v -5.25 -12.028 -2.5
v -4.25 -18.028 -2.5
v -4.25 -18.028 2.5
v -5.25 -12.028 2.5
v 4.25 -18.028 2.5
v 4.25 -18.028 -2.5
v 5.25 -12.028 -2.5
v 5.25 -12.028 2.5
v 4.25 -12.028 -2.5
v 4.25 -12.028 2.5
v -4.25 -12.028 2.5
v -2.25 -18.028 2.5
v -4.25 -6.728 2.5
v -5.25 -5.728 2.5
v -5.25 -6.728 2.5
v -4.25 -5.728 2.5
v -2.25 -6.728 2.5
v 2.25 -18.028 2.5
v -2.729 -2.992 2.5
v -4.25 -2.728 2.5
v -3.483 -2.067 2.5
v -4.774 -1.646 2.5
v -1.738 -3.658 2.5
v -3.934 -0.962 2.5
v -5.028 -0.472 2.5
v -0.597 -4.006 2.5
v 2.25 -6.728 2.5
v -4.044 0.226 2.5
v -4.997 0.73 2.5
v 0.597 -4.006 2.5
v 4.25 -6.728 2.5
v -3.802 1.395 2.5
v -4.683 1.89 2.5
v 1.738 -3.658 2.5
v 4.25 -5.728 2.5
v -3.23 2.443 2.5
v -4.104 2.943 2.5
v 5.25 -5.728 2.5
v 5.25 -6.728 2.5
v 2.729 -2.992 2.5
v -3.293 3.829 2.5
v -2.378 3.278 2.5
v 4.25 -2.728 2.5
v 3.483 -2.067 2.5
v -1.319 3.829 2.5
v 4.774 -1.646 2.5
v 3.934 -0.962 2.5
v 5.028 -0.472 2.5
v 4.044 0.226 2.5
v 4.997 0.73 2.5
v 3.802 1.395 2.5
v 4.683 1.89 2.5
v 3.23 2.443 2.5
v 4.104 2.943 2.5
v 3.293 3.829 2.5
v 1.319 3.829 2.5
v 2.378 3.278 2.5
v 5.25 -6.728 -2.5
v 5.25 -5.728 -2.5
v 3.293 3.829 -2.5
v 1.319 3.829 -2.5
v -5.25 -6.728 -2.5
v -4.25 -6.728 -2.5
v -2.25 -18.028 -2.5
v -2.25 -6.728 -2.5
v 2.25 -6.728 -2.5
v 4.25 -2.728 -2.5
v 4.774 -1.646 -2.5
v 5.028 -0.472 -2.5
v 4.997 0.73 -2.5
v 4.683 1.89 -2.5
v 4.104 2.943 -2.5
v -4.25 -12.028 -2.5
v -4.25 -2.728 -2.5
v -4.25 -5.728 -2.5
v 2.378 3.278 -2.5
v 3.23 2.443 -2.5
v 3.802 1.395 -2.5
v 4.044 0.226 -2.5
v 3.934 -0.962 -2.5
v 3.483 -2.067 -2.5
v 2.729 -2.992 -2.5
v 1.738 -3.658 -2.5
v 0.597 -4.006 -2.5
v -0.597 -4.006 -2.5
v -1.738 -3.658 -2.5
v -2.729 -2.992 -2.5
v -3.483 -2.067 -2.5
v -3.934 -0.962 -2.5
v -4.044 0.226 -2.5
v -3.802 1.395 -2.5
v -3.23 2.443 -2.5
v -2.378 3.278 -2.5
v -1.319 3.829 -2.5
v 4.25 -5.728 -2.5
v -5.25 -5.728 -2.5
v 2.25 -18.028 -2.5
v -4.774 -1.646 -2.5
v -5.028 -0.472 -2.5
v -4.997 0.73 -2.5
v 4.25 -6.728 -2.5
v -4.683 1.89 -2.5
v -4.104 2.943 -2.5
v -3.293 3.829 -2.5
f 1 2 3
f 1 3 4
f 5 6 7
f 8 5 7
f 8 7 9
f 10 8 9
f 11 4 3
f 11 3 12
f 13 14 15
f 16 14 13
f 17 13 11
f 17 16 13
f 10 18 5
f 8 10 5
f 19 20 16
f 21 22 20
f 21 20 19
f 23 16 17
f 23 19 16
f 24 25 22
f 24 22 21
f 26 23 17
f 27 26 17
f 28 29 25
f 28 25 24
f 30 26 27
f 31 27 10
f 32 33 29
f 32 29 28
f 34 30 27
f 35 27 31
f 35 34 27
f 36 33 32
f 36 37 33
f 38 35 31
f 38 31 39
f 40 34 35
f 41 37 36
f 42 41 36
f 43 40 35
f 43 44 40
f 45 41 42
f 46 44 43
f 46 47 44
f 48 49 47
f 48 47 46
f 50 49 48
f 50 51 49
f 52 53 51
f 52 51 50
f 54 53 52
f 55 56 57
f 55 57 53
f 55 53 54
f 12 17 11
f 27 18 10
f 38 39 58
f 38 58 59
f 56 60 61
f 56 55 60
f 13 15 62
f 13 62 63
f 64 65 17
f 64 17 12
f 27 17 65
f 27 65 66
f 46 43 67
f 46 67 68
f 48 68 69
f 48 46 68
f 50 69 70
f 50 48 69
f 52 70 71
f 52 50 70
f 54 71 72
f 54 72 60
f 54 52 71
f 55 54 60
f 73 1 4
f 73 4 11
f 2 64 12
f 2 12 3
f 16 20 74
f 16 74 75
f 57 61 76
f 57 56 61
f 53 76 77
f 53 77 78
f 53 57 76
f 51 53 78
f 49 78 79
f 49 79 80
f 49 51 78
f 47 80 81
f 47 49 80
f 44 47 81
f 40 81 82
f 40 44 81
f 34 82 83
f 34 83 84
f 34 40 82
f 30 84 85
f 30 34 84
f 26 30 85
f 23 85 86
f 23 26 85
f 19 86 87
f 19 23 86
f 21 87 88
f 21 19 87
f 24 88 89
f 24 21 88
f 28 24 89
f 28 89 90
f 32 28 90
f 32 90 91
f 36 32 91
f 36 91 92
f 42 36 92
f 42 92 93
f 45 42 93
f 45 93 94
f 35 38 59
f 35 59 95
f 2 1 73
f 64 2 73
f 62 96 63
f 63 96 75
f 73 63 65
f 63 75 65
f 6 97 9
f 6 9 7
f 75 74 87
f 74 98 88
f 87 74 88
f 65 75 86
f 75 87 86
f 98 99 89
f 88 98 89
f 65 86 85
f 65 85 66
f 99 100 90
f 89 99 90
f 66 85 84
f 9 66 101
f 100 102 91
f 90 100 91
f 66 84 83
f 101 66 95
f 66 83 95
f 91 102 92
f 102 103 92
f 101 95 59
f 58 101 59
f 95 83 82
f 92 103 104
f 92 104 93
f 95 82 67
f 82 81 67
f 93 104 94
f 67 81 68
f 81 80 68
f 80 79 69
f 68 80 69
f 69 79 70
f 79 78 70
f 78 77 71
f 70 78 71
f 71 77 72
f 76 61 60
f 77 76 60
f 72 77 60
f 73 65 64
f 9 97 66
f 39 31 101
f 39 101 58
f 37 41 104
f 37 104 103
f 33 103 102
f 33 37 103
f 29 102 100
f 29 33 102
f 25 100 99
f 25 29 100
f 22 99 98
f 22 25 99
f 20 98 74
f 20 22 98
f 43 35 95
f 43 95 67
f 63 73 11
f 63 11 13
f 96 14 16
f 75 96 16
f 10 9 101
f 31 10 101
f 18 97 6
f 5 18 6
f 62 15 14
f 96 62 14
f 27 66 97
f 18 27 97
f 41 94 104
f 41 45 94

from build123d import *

# Parameters (mm, degrees)
SKETCH2_W           = 1
SKETCH2_H           = 1.0000000000000009
BOSS_EXTRUDE1_DEPTH = 2.5
SNAP_START          = -2.5
SNAP_HOOK2_DEPTH    = 5


# Read off the part's stored shape, not the designer's step: Snap Hook2
with BuildPart() as part:
    # Sketch2 → Boss-Extrude1 (new, symmetric)
    with BuildSketch(Plane.XY):
        with BuildLine():
            Line((-1.319469931058069, 3.8290337033034687), (-3.2925675238278904, 3.8290337033034683))
            ThreePointArc((-3.2925675238278913, 3.829033703303468), (-4.9970052756714, 0.7296836814073608), (-4.25, -2.727636339397171))
            Line((-4.249999999999999, -2.7276363393971716), (-2.9937434759844463, -2.7276363393971716))
            ThreePointArc((-2.9937434759844717, -2.7276363393972467), (-3.9240837129048374, 1.0020314436757887), (-1.319469931058064, 3.829033703303436))
        make_face()
        with BuildLine():
            ThreePointArc((5.05, 0), (4.589660444702355, 2.1065414789019883), (3.29256752382789, 3.8290337033034683))
            Line((3.2925675238278904, 3.829033703303469), (1.3194699310580464, 3.8290337033034687))
            ThreePointArc((1.3194699310580424, 3.8290337033034434), (3.2974500163599956, 2.351451336857189), (4.05, 0))
            ThreePointArc((4.05, -9.9e-16), (3.7767155755853006, -1.4625045166191415), (2.9937434759845, -2.7276363393972156))
            Line((2.993743475984485, -2.7276363393971708), (4.250000000000001, -2.7276363393971708))
            ThreePointArc((4.25, -2.7276363393971708), (4.84587453407535, -1.421267040355192), (5.05, -1.24e-15))
        make_face()
        with BuildLine():
            Line((-2.9937434759844463, -2.7276363393971716), (-4.249999999999999, -2.7276363393971716))
            ThreePointArc((-4.25, -2.727636339397171), (-2.421563181711757, -4.431538305935991), (7.981e-14, -5.05))
            Line((1.49e-15, -5.05), (1.34e-15, -4.05))
            ThreePointArc((-5.11e-14, -4.05), (-1.636394332891877, -3.7046880553265678), (-2.9937434759844717, -2.7276363393972467))
        make_face()
        with BuildLine():
            Line((1.34e-15, -4.05), (1.49e-15, -5.05))
            ThreePointArc((7.981e-14, -5.05), (2.4215631817118264, -4.431538305935953), (4.25, -2.7276363393971708))
            Line((4.250000000000001, -2.7276363393971708), (2.993743475984485, -2.7276363393971708))
            ThreePointArc((2.9937434759845, -2.7276363393972156), (1.6363943328918495, -3.7046880553265797), (-5.11e-14, -4.05))
        make_face()
        with BuildLine():
            ThreePointArc((7.981e-14, -5.05), (-2.421563181711757, -4.431538305935991), (-4.25, -2.727636339397171))
            Line((-4.249999999999999, -2.7276363393971716), (-4.249999999999998, -5.727636339397171))
            Line((-4.249999999999998, -5.727636339397171), (-4.249999999999998, -6.727636339397172))
            Line((-4.249999999999998, -6.727636339397172), (1.78e-15, -6.727636339397172))
            Line((1.73e-15, -6.727636339397171), (1.49e-15, -5.05))
        make_face()
        with Locations((-4.749999999999998, -6.227636339397172)):
            Rectangle(SKETCH2_W, SKETCH2_H)
        with BuildLine():
            ThreePointArc((4.25, -2.7276363393971708), (2.4215631817118264, -4.431538305935953), (7.981e-14, -5.05))
            Line((1.49e-15, -5.05), (1.73e-15, -6.727636339397171))
            Line((1.78e-15, -6.727636339397172), (4.250000000000002, -6.727636339397171))
            Line((4.250000000000002, -6.72763633939717), (4.250000000000002, -5.72763633939717))
            Line((4.250000000000002, -5.72763633939717), (4.250000000000001, -2.7276363393971708))
        make_face()
        Polygon((4.250000000000002, -5.72763633939717), (4.250000000000002, -6.72763633939717), (5.250000000000002, -6.727636339397171), (5.250000000000002, -5.72763633939717), align=None)
    extrude(amount=BOSS_EXTRUDE1_DEPTH, both=True)

    # Snap Hook2 outline → Snap Hook2 (add)
    with BuildSketch(Plane.XY.offset(SNAP_START)):
        Polygon((5.25, -12.027636339), (4.25, -12.027636339), (4.25, -6.727636339), (2.25, -6.727636339), (2.25, -18.027636339), (4.25, -18.027636339), align=None)
    snap_hook2 = extrude(amount=SNAP_HOOK2_DEPTH)

    # Mirror1: Snap Hook2 across plane
    add(snap_hook2.mirror(Plane(origin=(0, 0, 0), x_dir=(0, 0, 1), z_dir=(1, 0, 0))))


solid = part.part
